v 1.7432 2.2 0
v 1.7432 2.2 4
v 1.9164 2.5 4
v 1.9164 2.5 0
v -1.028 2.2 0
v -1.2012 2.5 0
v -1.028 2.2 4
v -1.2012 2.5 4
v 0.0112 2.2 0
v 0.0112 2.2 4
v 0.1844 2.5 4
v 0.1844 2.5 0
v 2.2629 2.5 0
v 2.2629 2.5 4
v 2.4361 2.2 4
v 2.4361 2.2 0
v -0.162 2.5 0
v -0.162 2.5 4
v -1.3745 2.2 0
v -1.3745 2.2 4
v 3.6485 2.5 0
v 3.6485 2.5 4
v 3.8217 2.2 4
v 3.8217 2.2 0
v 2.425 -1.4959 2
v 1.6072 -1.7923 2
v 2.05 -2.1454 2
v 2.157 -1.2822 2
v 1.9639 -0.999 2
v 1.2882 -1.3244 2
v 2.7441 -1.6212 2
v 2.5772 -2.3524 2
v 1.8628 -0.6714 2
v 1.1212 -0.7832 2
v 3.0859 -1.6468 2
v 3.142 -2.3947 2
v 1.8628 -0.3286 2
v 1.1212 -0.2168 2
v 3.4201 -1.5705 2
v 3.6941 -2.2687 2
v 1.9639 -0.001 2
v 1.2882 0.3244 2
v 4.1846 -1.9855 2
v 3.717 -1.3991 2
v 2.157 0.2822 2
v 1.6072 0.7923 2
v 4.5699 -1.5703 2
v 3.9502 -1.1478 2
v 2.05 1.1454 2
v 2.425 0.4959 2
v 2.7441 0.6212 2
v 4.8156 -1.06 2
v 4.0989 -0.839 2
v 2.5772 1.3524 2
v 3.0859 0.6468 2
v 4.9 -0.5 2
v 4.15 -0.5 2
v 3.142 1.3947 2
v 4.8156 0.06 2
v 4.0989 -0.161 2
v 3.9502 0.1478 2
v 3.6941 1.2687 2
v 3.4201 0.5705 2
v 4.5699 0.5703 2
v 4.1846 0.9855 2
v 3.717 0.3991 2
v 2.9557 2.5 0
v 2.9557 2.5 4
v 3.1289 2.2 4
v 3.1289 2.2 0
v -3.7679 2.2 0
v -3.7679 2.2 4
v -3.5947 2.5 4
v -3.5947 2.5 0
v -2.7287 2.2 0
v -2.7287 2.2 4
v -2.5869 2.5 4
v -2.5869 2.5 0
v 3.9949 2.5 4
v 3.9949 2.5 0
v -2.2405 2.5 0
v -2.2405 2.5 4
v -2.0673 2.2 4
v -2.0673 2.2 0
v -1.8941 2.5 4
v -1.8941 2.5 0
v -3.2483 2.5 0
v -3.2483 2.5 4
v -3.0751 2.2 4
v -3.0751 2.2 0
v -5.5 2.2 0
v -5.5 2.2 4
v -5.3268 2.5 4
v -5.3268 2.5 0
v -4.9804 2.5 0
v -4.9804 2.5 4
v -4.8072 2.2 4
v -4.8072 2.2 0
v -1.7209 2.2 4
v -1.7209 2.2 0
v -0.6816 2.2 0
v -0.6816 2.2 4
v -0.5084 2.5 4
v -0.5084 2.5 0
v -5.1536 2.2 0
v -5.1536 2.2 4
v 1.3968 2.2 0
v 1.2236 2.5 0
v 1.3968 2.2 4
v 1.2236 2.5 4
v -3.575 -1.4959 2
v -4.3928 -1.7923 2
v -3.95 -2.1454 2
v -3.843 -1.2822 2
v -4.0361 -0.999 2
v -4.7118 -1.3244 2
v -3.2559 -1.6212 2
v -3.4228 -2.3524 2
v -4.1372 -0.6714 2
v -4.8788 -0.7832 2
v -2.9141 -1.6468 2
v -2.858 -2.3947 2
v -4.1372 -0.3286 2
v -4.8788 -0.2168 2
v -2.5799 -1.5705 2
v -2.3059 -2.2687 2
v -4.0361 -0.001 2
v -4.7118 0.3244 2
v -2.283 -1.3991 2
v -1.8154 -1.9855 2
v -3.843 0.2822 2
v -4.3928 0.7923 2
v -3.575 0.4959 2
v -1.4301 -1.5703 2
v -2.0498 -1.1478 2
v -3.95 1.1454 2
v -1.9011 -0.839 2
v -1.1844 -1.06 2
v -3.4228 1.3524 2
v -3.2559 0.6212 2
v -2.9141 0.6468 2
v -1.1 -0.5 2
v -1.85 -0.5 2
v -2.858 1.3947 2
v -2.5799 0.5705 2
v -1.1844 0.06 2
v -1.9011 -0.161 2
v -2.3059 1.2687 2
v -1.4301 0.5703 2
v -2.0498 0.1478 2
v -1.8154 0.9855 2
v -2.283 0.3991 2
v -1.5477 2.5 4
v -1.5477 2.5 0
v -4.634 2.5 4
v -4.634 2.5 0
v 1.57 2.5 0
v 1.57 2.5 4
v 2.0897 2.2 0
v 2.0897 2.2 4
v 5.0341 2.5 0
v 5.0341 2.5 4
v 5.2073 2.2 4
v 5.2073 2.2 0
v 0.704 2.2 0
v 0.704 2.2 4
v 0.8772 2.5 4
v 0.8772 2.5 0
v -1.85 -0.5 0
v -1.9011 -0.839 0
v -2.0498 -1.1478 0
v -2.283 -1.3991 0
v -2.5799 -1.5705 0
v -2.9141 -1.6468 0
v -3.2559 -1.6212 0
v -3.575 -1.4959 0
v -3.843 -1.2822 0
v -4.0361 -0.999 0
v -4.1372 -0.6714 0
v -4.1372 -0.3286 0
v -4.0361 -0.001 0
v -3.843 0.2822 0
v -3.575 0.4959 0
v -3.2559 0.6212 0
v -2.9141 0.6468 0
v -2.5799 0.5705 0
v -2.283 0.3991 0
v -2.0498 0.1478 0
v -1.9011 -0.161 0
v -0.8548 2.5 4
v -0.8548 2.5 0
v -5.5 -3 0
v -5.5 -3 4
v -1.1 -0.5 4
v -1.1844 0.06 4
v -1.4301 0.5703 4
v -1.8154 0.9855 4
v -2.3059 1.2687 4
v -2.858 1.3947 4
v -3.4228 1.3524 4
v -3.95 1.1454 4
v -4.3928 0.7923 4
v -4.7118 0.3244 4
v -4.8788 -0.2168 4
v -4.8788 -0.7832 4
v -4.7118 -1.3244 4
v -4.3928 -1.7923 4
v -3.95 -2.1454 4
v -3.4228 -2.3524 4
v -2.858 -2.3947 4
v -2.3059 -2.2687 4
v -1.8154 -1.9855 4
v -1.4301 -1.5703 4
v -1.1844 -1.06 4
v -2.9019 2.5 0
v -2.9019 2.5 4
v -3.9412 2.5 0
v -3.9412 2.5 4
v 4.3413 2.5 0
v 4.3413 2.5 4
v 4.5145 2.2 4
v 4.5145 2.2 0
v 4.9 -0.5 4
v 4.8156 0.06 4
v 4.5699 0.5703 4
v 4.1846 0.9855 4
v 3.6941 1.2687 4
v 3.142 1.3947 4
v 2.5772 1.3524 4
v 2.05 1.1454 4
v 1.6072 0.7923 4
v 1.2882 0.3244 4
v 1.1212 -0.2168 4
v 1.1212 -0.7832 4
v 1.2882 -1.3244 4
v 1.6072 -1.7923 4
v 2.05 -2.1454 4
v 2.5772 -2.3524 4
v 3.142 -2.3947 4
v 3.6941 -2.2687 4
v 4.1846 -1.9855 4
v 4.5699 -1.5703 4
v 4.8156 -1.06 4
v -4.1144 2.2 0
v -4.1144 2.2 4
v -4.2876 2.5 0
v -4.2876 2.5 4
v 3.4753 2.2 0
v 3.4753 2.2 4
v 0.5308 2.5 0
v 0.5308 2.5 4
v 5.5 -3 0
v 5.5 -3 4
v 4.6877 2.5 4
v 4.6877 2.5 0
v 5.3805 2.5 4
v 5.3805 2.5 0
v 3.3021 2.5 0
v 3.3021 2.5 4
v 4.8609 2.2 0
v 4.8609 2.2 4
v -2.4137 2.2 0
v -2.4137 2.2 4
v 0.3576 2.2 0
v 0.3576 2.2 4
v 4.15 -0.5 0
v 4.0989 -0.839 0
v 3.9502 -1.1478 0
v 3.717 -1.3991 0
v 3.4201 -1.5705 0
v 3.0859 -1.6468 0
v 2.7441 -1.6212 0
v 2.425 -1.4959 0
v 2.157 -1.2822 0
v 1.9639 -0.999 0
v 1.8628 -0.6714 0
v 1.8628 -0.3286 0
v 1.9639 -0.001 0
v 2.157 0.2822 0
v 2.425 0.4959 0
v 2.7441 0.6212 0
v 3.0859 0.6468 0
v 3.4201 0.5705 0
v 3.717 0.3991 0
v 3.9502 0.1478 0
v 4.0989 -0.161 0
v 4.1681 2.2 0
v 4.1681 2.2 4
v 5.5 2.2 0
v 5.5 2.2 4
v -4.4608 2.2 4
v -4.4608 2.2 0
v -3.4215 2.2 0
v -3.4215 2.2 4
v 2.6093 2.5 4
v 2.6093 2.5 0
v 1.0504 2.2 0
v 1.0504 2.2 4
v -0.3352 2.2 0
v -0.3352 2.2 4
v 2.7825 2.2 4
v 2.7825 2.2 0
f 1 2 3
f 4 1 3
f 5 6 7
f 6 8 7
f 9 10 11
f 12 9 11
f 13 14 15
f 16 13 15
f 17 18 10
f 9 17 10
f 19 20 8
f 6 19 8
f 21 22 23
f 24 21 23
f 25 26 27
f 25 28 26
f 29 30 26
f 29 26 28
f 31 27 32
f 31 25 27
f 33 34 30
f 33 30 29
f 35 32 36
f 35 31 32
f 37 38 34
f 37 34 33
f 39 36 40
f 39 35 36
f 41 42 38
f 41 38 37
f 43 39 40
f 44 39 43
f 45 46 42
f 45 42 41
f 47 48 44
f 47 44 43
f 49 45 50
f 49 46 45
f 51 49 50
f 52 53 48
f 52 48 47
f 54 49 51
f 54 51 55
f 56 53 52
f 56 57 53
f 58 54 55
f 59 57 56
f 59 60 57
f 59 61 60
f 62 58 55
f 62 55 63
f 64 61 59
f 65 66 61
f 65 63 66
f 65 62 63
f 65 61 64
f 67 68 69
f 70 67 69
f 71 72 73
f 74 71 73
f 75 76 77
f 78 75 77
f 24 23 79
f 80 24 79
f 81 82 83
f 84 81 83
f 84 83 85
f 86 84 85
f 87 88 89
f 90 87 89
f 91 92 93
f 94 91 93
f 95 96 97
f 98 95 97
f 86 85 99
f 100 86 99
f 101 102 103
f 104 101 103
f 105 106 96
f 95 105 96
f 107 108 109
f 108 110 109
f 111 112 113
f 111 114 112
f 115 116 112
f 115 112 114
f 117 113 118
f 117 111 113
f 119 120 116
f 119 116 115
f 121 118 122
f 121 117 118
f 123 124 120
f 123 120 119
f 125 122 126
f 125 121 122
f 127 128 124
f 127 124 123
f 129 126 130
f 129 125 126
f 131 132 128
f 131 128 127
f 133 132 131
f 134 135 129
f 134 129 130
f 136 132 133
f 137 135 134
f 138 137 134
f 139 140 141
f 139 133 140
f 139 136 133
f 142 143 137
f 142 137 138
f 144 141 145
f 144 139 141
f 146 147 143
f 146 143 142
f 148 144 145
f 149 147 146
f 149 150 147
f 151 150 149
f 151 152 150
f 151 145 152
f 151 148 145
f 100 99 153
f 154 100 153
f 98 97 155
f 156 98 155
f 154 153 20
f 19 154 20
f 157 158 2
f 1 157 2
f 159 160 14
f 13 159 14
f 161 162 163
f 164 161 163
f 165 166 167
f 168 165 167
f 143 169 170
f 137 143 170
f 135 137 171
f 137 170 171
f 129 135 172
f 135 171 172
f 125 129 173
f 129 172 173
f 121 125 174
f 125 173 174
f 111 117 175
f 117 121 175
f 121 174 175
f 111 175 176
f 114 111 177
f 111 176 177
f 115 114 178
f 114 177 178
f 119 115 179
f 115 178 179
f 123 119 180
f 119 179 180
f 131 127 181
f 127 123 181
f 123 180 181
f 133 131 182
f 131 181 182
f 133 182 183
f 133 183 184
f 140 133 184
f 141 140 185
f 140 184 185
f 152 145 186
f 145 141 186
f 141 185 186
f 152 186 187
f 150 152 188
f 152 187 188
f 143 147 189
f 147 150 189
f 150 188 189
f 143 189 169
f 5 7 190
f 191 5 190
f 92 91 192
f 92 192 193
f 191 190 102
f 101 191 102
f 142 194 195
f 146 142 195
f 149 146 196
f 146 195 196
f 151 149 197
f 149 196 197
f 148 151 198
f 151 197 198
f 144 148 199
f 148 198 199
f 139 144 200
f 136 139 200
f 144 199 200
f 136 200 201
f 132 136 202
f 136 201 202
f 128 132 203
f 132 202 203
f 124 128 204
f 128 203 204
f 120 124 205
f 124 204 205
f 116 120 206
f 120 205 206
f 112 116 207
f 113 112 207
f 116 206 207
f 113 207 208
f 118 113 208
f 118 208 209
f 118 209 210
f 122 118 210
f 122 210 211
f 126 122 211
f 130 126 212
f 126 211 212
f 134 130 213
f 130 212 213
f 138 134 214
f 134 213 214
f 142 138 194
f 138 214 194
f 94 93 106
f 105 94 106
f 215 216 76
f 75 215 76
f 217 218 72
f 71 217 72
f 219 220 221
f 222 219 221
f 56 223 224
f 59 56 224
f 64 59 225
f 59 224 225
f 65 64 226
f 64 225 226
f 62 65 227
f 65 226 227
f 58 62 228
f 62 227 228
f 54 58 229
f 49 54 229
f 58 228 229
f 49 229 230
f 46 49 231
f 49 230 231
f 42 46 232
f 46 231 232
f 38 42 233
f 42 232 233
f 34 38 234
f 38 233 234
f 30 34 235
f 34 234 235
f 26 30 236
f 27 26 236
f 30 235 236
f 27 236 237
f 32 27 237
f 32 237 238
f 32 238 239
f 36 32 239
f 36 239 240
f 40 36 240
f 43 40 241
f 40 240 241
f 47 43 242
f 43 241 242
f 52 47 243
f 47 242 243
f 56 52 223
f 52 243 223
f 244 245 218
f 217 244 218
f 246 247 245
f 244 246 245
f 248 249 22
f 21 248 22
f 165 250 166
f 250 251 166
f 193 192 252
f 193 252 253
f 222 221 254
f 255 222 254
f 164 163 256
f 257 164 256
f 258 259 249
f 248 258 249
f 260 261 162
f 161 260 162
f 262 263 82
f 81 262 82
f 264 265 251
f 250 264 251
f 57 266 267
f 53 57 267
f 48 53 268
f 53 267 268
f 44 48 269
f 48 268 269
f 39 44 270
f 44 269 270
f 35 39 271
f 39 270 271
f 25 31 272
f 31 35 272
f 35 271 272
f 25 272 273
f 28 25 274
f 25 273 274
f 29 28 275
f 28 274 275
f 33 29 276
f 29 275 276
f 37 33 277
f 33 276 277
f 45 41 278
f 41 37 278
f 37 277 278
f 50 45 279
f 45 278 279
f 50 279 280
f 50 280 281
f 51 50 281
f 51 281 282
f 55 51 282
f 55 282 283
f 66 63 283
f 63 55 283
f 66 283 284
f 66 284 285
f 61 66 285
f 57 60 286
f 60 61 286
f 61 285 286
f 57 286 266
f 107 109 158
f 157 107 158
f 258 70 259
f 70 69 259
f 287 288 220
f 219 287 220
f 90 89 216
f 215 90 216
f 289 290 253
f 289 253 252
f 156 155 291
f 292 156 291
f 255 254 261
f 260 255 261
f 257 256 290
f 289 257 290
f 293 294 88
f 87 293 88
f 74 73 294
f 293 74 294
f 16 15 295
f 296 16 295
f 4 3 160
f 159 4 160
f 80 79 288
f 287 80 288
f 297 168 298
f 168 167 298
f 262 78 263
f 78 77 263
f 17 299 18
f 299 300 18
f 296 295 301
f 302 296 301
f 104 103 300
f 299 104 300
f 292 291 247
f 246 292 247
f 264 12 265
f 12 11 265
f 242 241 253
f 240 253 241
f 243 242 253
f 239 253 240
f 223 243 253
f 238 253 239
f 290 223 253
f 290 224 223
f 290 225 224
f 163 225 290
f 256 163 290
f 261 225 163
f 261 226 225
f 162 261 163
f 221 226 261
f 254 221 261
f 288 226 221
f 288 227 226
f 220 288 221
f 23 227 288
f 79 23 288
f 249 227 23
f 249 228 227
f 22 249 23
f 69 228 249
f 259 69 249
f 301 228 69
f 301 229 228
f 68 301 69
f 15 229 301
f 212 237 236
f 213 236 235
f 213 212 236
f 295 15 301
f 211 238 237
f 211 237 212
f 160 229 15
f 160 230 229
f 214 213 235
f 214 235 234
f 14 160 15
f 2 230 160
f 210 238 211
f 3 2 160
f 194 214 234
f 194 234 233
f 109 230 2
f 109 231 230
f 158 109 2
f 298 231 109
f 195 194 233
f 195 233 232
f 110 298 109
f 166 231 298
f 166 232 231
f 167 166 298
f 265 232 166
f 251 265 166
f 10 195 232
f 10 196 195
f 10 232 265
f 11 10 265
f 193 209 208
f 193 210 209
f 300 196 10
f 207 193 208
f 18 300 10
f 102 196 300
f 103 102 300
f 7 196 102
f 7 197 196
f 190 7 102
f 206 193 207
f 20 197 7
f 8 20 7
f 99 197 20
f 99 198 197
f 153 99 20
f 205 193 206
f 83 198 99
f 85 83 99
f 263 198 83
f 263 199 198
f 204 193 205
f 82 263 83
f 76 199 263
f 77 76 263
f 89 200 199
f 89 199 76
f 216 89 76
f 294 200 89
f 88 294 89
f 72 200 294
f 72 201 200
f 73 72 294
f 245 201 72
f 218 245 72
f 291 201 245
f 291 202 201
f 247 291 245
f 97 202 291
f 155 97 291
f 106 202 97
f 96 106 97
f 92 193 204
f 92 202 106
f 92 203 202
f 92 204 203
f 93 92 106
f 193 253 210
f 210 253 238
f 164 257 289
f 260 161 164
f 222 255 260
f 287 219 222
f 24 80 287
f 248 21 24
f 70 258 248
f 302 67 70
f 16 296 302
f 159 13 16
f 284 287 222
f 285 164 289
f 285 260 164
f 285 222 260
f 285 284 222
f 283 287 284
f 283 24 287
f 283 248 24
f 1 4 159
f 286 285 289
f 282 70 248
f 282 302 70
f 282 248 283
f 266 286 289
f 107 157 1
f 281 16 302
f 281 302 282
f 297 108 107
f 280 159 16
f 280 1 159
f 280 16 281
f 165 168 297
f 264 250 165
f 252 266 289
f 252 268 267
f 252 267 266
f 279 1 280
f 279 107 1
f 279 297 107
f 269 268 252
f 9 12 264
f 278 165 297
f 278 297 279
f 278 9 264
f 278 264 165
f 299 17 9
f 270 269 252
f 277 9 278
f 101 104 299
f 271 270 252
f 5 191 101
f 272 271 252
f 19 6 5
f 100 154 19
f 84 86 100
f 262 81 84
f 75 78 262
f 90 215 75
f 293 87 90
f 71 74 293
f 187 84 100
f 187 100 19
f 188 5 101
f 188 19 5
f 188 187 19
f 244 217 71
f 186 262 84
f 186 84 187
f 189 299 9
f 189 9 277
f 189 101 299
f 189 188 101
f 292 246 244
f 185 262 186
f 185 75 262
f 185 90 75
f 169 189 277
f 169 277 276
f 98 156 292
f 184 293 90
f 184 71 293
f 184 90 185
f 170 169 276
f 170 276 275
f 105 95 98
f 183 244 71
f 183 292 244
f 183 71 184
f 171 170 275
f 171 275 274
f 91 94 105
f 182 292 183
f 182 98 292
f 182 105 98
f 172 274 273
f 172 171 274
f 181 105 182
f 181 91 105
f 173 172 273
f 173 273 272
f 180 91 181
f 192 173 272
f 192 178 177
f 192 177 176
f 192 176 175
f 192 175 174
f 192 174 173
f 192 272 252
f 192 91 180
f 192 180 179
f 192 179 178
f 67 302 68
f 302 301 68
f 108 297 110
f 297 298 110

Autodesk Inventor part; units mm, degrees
ref_plane "YZ Plane" through (0, 0, 0) normal (1, 0, 0) x (0, 1, 0)
ref_plane "XZ Plane" through (0, 0, 0) normal (0, 1, 0) x (-1, 0, 0)
ref_plane "XY Plane" through (0, 0, 0) normal (0, 0, 1) x (1, 0, 0)
sketch "スケッチ1" plane through (0, 0, 0) normal (0, 0, 1) x (1, 0, 0)
  line L0 (5, -2.5) -> (-5, -2.5)
  line L1 (-5, -2.5) -> (-5, 2.5)
  line L2 (-5, 2.5) -> (5, 2.5)
  line L3 (5, 2.5) -> (5, -2.5)
  line L4 (5, -2.5) -> (-5, 2.5) construction
  line L5 (-5, -2.5) -> (5, 2.5) construction
  circle A0 centre (-3, -0.5) radius 1.15
  circle A1 centre (3, -0.5) radius 1.15
  point P0 (0, 0)
  dimension "d0" = 10
  dimension "d1" = 5
  dimension "d2" = 2.3
  dimension "d3" = 2.3
extrude "押し出し1" add sketch "スケッチ1" along normal blind 4
sketch "スケッチ2" plane through (0, 0, 4) normal (0, 0, 1) x (1, 0, 0)
  circle A0 centre (-3, -0.5) radius 1.15 projected
  circle A1 centre (-3, -0.5) radius 1.9
  circle A2 centre (3, -0.5) radius 1.15 projected
  circle A3 centre (3, -0.5) radius 1.9
  point P0 (0, 0)
  dimension "d6" = 3.8
  dimension "d7" = 3.8
extrude "押し出し2" cut sketch "スケッチ2" against normal blind 2
sketch "スケッチ3" plane through (-5, -2.5, 0) normal (0, -1, 0) x (1, 0, 0)
  line L0 (10, 0) -> (0, 0) projected
  line L1 (0, 0) -> (10, 0)
  line L2 (10, 0) -> (10, 4)
  line L3 (10, 4) -> (0, 4)
  line L4 (0, 4) -> (0, 0)
  point P0 (5, 0)
extrude "押し出し3" add sketch "スケッチ3" along normal blind 0.5
sketch "スケッチ4" plane through (-5, 2.5, 0) normal (-1, 0, 0) x (0, 0, 1)
  line L0 (0, 0) -> (0, -5.5) projected
  line L1 (0, 0) -> (4, 0) projected
  line L2 (0, -5.5) -> (4, -5.5)
  line L3 (4, -5.5) -> (4, 0)
  line L4 (4, 0) -> (0, 0)
  line L5 (0, 0) -> (0, -5.5)
  point P0 (0, -2.5)
extrude "押し出し4" add sketch "スケッチ4" along normal blind 0.5
sketch "スケッチ5" plane through (5, 2.5, 4) normal (1, 0, 0) x (0, 0, -1)
  line L0 (4, 0) -> (4, -5.5) projected
  line L1 (4, 0) -> (0, 0) projected
  line L2 (4, -5.5) -> (0, -5.5)
  line L3 (0, -5.5) -> (0, 0)
  line L4 (0, 0) -> (4, 0)
  line L5 (4, 0) -> (4, -5.5)
  point P0 (4, -2.5)
extrude "押し出し5" add sketch "スケッチ5" along normal blind 0.5
sketch "スケッチ6" plane through (0, 0, 4) normal (0, 0, 1) x (1, 0, 0)
  line L0 (-5.5, 2.5) -> (5.5, 2.5) projected
  line L1 (-5.5, 2.5) -> (5.5, 2.5)
  line L2 (5.5, 2.5) -> (5.5, -3) projected
  line L3 (5.5, 2.5) -> (5.5, 2.2)
  line L4 (5.5, 2.2) -> (-5.5, 2.2)
  line L5 (-5.5, -3) -> (-5.5, 2.5) projected
  line L6 (-5.5, 2.2) -> (-5.5, 2.5)
  line L7 (-5.5, 2.2) -> (-5.3268, 2.5)
  line L8 (-5.5, 2.2) -> (-5.1536, 2.2) construction
  line L9 (-5.3268, 2.5) -> (-5.1536, 2.2)
  line L10 (-5.1536, 2.2) -> (-4.9804, 2.5)
  line L11 (-4.9804, 2.5) -> (-4.8072, 2.2)
  line L12 (-4.8072, 2.2) -> (-4.634, 2.5)
  line L13 (-4.634, 2.5) -> (-4.4608, 2.2)
  line L14 (-4.4608, 2.2) -> (-4.2876, 2.5)
  line L15 (-4.2876, 2.5) -> (-4.1144, 2.2)
  line L16 (-4.1144, 2.2) -> (-3.9412, 2.5)
  line L17 (-3.9412, 2.5) -> (-3.7679, 2.2)
  line L18 (-3.7679, 2.2) -> (-3.5947, 2.5)
  line L19 (-3.5947, 2.5) -> (-3.4215, 2.2)
  line L20 (-3.4215, 2.2) -> (-3.2483, 2.5)
  line L21 (-3.2483, 2.5) -> (-3.0751, 2.2)
  line L22 (-3.0751, 2.2) -> (-2.9019, 2.5)
  line L23 (-2.9019, 2.5) -> (-2.7287, 2.2)
  line L24 (-2.7287, 2.2) -> (-2.5869, 2.5)
  line L25 (-2.5869, 2.5) -> (-2.4137, 2.2)
  line L26 (-2.4137, 2.2) -> (-2.2405, 2.5)
  line L27 (-2.2405, 2.5) -> (-2.0673, 2.2)
  line L28 (-2.0673, 2.2) -> (-1.8941, 2.5)
  line L29 (-1.8941, 2.5) -> (-1.7209, 2.2)
  line L30 (-1.7209, 2.2) -> (-1.5477, 2.5)
  line L31 (-1.5477, 2.5) -> (-1.3745, 2.2)
  line L32 (-1.3745, 2.2) -> (-1.2012, 2.5)
  line L33 (-1.2012, 2.5) -> (-1.028, 2.2)
  line L34 (-1.028, 2.2) -> (-0.8548, 2.5)
  line L35 (-0.8548, 2.5) -> (-0.6816, 2.2)
  line L36 (-0.6816, 2.2) -> (-0.5084, 2.5)
  line L37 (-0.5084, 2.5) -> (-0.3352, 2.2)
  line L38 (-0.3352, 2.2) -> (-0.162, 2.5)
  line L39 (-0.162, 2.5) -> (0.0112, 2.2)
  line L40 (0.0112, 2.2) -> (0.1844, 2.5)
  line L41 (0.1844, 2.5) -> (0.3576, 2.2)
  line L42 (0.3576, 2.2) -> (0.5308, 2.5)
  line L43 (0.5308, 2.5) -> (0.704, 2.2)
  line L44 (0.704, 2.2) -> (0.8772, 2.5)
  line L45 (0.8772, 2.5) -> (1.0504, 2.2)
  line L46 (1.0504, 2.2) -> (1.2236, 2.5)
  line L47 (1.2236, 2.5) -> (1.3968, 2.2)
  line L48 (1.3968, 2.2) -> (1.57, 2.5)
  line L49 (1.57, 2.5) -> (1.7432, 2.2)
  line L50 (1.7432, 2.2) -> (1.9164, 2.5)
  line L51 (1.9164, 2.5) -> (2.0897, 2.2)
  line L52 (2.0897, 2.2) -> (2.2629, 2.5)
  line L53 (2.2629, 2.5) -> (2.4361, 2.2)
  line L54 (2.4361, 2.2) -> (2.6093, 2.5)
  line L55 (2.6093, 2.5) -> (2.7825, 2.2)
  line L56 (2.7825, 2.2) -> (2.9557, 2.5)
  line L57 (2.9557, 2.5) -> (3.1289, 2.2)
  line L58 (3.1289, 2.2) -> (3.3021, 2.5)
  line L59 (3.3021, 2.5) -> (3.4753, 2.2)
  line L60 (3.4753, 2.2) -> (3.6485, 2.5)
  line L61 (3.6485, 2.5) -> (3.8217, 2.2)
  line L62 (3.8217, 2.2) -> (3.9949, 2.5)
  line L63 (3.9949, 2.5) -> (4.1681, 2.2)
  line L64 (4.1681, 2.2) -> (4.3413, 2.5)
  line L65 (4.3413, 2.5) -> (4.5145, 2.2)
  line L66 (4.5145, 2.2) -> (4.6877, 2.5)
  line L67 (4.6877, 2.5) -> (4.8609, 2.2)
  line L68 (4.8609, 2.2) -> (5.0341, 2.5)
  line L69 (5.0341, 2.5) -> (5.2073, 2.2)
  line L70 (5.2073, 2.2) -> (5.3805, 2.5)
  line L71 (5.3805, 2.5) -> (5.5, 2.2)
  point P0 (0, 0)
  dimension "d16" = 0.3
  dimension "d17" = 60
extrude "押し出し6" cut sketch "スケッチ6" against normal blind 10 contours L0 L7 L5 | L0 L10 L9 | L0 L12 L11 | L0 L14 L13 | L0 L16 L15 | L0 L18 L17 | L0 L20 L19 | L0 L22 L21 | L0 L24 L23 | L0 L26 L25 | L0 L28 L27 | L0 L30 L29 | L0 L32 L31 | L0 L34 L33 | L0 L36 L35 | L0 L38 L37 | L0 L40 L39 | L0 L42 L41 | L0 L44 L43 | L0 L46 L45 | L0 L48 L47 | L0 L50 L49 | L0 L52 L51 | L0 L54 L53 | L0 L56 L55 | L0 L58 L57 | L0 L60 L59 | L0 L62 L61 | L0 L64 L63 | L0 L66 L65 | L0 L68 L67 | L0 L70 L69 | L0 L2 L71
properties part number "gripping_base" material "ゴム、黒"
